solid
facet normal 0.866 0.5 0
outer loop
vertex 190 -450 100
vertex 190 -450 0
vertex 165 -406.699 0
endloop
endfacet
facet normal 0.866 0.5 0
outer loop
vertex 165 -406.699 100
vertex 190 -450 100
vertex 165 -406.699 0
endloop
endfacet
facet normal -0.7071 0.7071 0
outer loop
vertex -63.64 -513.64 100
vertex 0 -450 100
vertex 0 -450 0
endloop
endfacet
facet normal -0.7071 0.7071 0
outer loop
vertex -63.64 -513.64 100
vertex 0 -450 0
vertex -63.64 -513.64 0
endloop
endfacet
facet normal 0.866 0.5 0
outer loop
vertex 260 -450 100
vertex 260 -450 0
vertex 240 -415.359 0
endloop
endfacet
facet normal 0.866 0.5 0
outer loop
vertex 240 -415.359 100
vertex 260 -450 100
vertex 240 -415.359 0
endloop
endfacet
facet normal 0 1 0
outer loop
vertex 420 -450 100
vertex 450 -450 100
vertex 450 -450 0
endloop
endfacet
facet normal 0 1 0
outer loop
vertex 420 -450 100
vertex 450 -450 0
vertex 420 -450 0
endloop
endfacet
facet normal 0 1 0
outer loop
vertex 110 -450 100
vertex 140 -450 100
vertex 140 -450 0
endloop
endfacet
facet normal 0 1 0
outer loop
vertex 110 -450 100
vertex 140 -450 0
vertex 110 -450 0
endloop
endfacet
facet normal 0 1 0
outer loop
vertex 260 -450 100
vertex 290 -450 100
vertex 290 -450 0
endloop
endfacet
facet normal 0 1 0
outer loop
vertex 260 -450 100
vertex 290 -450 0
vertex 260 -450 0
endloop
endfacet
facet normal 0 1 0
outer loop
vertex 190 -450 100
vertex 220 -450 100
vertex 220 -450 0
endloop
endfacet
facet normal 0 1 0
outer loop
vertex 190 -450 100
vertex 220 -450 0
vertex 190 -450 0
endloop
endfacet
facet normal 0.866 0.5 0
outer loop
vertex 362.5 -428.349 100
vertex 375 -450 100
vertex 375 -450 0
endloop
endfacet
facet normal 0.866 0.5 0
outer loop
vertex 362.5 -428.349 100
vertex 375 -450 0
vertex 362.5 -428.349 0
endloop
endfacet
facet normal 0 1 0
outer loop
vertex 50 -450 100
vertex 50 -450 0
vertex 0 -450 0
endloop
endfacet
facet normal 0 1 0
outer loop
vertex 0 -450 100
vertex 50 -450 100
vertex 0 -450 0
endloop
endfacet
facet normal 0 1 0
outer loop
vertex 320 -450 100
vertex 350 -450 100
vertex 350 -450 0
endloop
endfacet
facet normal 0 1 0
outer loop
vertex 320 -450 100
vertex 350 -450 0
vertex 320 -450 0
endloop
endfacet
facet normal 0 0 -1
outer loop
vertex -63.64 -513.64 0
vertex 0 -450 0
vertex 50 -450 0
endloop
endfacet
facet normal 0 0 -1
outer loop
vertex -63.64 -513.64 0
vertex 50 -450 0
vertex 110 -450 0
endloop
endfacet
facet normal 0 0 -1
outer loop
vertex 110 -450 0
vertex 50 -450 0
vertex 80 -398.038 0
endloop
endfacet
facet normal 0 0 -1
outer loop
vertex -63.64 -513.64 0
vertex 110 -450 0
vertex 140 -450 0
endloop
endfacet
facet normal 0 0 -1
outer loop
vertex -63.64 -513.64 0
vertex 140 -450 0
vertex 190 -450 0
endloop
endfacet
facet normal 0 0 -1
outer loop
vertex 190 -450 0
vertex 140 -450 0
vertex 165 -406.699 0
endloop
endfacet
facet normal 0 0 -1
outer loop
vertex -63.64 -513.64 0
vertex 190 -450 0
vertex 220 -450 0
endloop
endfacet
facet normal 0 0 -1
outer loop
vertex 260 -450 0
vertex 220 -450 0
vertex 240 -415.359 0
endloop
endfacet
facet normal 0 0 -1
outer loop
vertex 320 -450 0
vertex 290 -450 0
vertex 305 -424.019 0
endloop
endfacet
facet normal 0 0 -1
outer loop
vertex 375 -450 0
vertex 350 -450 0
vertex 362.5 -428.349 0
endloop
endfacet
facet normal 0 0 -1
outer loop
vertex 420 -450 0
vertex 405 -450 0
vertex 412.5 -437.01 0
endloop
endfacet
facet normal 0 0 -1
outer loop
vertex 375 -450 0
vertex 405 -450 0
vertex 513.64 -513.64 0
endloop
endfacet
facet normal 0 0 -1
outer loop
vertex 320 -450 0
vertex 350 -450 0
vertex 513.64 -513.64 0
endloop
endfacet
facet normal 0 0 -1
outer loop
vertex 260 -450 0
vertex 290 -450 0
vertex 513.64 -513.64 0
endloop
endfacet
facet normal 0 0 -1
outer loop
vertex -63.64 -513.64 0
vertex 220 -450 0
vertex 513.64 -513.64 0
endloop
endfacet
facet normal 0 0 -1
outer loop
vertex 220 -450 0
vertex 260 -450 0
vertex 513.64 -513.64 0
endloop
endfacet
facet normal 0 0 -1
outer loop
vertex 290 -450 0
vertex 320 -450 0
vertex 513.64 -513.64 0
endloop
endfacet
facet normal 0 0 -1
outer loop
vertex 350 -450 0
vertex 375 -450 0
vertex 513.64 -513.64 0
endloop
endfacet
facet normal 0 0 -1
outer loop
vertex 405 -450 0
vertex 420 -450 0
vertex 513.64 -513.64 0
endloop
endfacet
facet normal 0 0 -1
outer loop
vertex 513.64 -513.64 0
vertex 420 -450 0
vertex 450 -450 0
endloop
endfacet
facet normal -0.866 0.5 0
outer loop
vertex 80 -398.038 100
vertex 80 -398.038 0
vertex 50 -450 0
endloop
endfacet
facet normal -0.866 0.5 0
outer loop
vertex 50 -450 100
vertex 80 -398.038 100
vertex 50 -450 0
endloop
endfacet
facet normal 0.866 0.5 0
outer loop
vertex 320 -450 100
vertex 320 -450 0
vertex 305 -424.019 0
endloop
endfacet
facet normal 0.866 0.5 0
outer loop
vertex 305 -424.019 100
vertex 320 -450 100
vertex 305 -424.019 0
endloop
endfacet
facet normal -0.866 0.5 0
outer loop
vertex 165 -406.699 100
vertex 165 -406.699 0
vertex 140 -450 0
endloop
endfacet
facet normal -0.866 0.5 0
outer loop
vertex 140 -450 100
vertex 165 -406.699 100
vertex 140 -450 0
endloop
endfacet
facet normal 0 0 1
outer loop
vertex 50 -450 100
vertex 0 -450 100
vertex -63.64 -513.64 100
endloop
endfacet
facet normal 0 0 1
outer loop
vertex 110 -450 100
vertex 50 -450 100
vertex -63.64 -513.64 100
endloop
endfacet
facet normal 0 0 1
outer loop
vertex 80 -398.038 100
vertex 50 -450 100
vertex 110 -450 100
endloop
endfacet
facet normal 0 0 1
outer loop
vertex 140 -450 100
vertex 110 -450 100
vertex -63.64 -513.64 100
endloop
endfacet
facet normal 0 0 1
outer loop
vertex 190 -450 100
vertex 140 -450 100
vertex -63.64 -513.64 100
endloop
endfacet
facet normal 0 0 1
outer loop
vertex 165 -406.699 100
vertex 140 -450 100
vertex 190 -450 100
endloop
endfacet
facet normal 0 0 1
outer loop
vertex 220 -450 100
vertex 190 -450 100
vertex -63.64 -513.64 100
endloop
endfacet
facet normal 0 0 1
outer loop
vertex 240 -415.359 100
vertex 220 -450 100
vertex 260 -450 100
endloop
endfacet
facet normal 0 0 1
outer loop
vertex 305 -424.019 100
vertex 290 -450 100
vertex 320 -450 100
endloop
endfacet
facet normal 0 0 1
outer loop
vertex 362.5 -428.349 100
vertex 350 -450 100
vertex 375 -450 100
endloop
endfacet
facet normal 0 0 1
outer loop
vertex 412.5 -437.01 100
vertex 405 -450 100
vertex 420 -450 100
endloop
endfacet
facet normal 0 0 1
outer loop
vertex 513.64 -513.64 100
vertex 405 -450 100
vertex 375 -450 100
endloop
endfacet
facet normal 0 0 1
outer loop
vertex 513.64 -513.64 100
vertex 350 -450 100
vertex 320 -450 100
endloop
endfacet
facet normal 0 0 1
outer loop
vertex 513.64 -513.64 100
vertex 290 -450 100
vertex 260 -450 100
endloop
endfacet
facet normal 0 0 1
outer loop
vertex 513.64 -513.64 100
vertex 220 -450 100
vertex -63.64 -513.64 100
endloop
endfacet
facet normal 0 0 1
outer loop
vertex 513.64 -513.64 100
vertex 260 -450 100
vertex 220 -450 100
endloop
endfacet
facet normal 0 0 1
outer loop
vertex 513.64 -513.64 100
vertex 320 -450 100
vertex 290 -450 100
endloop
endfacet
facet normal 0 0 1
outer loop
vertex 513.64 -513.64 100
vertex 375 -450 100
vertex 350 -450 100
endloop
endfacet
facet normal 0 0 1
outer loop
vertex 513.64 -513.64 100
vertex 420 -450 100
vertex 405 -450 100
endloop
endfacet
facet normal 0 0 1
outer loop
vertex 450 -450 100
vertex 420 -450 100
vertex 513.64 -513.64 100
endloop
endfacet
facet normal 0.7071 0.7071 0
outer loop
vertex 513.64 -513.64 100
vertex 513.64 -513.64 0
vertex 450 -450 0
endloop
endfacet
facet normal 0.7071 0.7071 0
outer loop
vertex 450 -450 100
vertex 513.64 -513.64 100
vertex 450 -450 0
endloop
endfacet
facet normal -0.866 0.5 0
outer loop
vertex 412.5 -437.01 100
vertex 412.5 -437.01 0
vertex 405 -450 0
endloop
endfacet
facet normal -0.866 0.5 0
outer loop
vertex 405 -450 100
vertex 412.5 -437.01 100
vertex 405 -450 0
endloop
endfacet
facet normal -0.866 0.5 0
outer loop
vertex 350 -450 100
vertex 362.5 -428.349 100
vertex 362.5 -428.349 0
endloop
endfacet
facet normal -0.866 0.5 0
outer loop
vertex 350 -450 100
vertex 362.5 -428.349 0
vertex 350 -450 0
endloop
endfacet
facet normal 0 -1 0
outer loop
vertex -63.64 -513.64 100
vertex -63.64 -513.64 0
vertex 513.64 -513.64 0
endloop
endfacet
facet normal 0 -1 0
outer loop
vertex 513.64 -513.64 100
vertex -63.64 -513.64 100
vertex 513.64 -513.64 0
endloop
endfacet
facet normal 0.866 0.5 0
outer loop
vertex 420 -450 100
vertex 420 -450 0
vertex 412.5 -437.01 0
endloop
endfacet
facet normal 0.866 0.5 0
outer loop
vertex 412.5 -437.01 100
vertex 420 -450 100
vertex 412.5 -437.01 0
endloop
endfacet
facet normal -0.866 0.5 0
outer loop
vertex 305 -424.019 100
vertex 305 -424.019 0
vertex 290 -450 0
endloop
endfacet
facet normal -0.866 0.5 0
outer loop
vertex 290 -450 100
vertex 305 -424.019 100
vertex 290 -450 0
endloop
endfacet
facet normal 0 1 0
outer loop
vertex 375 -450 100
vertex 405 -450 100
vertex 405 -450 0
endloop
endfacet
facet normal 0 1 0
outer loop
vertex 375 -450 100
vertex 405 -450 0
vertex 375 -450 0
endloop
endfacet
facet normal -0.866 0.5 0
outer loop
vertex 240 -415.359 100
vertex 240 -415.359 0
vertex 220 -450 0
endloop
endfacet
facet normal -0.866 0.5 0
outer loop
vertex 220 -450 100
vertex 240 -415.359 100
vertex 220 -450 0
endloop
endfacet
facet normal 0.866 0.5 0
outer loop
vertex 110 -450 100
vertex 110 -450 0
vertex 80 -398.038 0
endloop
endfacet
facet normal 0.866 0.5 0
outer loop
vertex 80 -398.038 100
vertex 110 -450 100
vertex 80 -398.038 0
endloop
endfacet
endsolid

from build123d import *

# Parameters (mm, degrees)
F1_DEPTH = 100


with BuildPart() as f1:
    # F0 (on Top) → F1 (new body)
    with BuildSketch(Plane.XY):
        Polygon((-63.63961, -513.63961), (513.63961, -513.63961), (450, -450), (420, -450), (405, -450), (375, -450), (350, -450), (320, -450), (290, -450), (260, -450), (220, -450), (190, -450), (140, -450), (110, -450), (50, -450), (0, -450), align=None)
        Polygon((80, -398.038476), (50, -450), (110, -450), align=None)
        Polygon((165, -406.69873), (140, -450), (190, -450), align=None)
        Polygon((240, -415.358984), (220, -450), (260, -450), align=None)
        Polygon((290, -450), (320, -450), (305, -424.019238), align=None)
        Polygon((350, -450), (375, -450), (362.5, -428.349365), align=None)
        Polygon((405, -450), (420, -450), (412.5, -437.009619), align=None)
    extrude(amount=F1_DEPTH)


solid = f1.part
